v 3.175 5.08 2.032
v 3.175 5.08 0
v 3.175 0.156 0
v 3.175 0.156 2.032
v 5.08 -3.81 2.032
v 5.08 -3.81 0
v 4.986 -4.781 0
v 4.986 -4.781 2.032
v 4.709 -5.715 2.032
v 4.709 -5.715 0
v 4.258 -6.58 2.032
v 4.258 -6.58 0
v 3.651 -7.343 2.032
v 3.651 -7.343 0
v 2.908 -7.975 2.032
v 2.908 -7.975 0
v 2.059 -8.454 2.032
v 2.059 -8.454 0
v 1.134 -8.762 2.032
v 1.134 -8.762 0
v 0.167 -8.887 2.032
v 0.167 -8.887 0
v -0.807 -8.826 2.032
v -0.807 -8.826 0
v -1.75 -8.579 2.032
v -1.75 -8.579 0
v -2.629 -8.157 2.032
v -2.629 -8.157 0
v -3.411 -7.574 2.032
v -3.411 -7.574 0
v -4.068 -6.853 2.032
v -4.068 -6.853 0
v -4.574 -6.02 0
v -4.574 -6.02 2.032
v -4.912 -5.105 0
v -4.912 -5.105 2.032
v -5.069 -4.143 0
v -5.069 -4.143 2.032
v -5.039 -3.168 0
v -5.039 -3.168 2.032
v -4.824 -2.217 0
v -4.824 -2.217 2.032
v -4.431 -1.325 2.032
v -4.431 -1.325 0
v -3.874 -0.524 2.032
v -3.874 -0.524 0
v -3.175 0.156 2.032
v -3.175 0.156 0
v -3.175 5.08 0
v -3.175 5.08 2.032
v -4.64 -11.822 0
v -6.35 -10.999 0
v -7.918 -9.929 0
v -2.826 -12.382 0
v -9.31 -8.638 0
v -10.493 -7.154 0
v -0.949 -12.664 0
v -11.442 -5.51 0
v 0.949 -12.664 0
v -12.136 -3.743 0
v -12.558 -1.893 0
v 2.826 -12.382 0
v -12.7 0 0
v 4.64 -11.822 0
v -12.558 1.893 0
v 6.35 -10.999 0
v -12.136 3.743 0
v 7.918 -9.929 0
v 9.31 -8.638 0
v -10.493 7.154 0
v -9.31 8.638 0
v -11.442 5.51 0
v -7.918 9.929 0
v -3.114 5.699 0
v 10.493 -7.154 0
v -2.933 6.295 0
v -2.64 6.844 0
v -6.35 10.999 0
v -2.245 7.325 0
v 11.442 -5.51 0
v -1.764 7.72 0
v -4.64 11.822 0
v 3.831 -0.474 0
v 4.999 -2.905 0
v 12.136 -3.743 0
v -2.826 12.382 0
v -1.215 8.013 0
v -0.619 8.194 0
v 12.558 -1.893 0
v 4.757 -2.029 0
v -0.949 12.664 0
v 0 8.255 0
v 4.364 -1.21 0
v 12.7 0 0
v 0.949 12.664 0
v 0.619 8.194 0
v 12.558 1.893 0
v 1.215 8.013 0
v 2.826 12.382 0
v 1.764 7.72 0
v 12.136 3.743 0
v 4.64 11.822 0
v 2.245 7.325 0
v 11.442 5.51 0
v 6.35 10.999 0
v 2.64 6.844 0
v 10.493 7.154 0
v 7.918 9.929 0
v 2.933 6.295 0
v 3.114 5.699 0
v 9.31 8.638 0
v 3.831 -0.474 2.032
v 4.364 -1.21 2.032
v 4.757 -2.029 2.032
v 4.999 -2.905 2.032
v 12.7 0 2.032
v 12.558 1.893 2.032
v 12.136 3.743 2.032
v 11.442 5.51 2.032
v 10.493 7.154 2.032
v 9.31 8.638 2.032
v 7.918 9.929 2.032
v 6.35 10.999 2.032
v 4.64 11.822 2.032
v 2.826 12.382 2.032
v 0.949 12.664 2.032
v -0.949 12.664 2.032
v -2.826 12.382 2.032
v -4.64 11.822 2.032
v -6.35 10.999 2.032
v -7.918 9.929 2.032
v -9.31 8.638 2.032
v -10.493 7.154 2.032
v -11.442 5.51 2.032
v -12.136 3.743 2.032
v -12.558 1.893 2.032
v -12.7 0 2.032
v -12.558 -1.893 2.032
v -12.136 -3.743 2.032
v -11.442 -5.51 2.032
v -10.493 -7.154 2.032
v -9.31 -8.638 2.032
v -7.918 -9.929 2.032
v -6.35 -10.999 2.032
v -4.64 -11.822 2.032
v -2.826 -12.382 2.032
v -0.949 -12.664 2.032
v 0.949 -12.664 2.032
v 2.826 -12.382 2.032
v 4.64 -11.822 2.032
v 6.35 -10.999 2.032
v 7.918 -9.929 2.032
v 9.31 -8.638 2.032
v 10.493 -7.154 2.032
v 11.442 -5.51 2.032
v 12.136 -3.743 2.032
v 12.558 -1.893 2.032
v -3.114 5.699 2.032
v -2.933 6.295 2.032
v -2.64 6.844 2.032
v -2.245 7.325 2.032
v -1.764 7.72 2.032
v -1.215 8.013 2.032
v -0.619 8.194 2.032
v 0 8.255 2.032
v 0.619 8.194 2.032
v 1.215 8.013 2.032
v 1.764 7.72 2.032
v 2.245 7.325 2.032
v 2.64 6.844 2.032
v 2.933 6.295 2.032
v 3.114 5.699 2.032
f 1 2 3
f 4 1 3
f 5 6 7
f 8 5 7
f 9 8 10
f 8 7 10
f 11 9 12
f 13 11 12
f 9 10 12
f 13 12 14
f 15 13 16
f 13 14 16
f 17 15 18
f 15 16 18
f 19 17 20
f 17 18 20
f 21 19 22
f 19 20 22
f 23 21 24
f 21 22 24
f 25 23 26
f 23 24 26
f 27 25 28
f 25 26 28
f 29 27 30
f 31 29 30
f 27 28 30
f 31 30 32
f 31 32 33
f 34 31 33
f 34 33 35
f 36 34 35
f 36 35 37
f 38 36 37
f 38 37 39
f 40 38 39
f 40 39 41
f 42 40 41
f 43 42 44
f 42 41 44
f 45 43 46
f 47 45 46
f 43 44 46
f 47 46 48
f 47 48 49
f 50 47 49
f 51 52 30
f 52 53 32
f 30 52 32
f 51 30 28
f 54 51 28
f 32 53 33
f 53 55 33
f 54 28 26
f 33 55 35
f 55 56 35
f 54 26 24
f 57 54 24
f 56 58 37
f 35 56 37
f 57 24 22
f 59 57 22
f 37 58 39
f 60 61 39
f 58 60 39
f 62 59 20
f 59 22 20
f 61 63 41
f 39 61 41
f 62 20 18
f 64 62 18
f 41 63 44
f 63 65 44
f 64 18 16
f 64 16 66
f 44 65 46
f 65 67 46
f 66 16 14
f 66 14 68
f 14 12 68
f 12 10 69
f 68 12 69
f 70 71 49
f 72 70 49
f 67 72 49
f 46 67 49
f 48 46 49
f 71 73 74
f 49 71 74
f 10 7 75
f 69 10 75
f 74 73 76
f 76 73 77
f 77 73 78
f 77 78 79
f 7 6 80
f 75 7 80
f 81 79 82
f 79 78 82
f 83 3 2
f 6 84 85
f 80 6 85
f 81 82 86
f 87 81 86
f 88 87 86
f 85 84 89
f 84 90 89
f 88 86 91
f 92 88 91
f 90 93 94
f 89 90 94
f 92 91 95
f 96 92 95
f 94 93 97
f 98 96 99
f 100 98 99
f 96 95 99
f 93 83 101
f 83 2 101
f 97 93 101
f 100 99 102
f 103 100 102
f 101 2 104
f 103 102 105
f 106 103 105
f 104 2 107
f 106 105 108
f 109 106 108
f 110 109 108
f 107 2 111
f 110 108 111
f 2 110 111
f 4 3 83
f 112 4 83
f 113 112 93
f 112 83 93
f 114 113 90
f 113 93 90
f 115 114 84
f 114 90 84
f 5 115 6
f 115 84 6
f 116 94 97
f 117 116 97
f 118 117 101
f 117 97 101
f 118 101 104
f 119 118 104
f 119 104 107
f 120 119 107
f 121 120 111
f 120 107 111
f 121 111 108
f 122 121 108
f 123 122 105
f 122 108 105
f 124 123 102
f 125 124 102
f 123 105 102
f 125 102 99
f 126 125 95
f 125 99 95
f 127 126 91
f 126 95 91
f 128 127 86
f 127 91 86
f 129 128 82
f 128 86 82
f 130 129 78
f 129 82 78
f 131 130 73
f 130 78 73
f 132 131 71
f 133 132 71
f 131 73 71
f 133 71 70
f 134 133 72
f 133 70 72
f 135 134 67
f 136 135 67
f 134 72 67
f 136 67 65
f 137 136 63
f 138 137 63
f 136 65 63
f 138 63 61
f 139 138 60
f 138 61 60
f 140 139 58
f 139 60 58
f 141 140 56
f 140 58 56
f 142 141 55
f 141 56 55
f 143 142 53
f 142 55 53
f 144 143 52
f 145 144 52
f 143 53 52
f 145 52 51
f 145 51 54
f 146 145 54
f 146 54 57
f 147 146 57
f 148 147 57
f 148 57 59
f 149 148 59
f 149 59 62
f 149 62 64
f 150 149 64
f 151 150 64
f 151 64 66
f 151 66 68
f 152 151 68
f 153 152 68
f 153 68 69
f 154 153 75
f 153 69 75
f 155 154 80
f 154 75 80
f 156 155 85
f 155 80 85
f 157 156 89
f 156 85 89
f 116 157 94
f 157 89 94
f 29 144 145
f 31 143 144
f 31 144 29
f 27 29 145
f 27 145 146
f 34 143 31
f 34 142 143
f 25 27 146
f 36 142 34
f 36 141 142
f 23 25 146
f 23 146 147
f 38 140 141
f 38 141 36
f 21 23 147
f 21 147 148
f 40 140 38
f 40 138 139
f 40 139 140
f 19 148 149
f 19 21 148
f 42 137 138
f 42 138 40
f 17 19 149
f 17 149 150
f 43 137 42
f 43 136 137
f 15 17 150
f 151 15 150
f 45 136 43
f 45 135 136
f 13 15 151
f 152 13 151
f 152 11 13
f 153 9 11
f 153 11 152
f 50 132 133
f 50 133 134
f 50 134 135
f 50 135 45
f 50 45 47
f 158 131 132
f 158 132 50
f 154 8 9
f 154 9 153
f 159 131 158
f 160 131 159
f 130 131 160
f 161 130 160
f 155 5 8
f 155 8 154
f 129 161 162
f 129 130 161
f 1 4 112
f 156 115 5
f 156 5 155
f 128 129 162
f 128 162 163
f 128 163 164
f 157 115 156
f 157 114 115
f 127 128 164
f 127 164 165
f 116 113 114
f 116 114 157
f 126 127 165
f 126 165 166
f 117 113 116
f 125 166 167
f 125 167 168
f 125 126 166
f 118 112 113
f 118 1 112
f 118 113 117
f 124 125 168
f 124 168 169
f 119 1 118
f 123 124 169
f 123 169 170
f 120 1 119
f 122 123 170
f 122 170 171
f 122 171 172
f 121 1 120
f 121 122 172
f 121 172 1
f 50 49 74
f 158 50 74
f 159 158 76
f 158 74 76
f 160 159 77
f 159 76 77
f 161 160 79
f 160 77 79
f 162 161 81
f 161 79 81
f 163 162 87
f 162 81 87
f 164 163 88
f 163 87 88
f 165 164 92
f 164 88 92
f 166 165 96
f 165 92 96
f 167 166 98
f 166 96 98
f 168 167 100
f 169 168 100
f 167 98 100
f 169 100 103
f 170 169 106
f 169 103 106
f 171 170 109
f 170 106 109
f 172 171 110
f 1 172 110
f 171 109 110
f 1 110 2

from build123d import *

# Parameters (mm, degrees)
F0_R     = 12.7
F1_DEPTH = 2.032


with BuildPart() as f1:
    # F0 (on Top) → F1 (new body)
    with BuildSketch(Plane.XY):
        Circle(F0_R)
        with BuildLine():
            ThreePointArc((3.175, 0.155574), (4.57905, -1.610295), (5.08, -3.81))
            ThreePointArc((5.08, -3.81), (-2.199705, -8.38905), (-3.175, 0.155574))
            Line((-3.175, 0.155574), (-3.175, 5.08))
            ThreePointArc((-3.175, 5.08), (0, 8.255), (3.175, 5.08))
            Line((3.175, 5.08), (3.175, 0.155574))
        make_face(mode=Mode.SUBTRACT)
    extrude(amount=F1_DEPTH)


solid = f1.part
